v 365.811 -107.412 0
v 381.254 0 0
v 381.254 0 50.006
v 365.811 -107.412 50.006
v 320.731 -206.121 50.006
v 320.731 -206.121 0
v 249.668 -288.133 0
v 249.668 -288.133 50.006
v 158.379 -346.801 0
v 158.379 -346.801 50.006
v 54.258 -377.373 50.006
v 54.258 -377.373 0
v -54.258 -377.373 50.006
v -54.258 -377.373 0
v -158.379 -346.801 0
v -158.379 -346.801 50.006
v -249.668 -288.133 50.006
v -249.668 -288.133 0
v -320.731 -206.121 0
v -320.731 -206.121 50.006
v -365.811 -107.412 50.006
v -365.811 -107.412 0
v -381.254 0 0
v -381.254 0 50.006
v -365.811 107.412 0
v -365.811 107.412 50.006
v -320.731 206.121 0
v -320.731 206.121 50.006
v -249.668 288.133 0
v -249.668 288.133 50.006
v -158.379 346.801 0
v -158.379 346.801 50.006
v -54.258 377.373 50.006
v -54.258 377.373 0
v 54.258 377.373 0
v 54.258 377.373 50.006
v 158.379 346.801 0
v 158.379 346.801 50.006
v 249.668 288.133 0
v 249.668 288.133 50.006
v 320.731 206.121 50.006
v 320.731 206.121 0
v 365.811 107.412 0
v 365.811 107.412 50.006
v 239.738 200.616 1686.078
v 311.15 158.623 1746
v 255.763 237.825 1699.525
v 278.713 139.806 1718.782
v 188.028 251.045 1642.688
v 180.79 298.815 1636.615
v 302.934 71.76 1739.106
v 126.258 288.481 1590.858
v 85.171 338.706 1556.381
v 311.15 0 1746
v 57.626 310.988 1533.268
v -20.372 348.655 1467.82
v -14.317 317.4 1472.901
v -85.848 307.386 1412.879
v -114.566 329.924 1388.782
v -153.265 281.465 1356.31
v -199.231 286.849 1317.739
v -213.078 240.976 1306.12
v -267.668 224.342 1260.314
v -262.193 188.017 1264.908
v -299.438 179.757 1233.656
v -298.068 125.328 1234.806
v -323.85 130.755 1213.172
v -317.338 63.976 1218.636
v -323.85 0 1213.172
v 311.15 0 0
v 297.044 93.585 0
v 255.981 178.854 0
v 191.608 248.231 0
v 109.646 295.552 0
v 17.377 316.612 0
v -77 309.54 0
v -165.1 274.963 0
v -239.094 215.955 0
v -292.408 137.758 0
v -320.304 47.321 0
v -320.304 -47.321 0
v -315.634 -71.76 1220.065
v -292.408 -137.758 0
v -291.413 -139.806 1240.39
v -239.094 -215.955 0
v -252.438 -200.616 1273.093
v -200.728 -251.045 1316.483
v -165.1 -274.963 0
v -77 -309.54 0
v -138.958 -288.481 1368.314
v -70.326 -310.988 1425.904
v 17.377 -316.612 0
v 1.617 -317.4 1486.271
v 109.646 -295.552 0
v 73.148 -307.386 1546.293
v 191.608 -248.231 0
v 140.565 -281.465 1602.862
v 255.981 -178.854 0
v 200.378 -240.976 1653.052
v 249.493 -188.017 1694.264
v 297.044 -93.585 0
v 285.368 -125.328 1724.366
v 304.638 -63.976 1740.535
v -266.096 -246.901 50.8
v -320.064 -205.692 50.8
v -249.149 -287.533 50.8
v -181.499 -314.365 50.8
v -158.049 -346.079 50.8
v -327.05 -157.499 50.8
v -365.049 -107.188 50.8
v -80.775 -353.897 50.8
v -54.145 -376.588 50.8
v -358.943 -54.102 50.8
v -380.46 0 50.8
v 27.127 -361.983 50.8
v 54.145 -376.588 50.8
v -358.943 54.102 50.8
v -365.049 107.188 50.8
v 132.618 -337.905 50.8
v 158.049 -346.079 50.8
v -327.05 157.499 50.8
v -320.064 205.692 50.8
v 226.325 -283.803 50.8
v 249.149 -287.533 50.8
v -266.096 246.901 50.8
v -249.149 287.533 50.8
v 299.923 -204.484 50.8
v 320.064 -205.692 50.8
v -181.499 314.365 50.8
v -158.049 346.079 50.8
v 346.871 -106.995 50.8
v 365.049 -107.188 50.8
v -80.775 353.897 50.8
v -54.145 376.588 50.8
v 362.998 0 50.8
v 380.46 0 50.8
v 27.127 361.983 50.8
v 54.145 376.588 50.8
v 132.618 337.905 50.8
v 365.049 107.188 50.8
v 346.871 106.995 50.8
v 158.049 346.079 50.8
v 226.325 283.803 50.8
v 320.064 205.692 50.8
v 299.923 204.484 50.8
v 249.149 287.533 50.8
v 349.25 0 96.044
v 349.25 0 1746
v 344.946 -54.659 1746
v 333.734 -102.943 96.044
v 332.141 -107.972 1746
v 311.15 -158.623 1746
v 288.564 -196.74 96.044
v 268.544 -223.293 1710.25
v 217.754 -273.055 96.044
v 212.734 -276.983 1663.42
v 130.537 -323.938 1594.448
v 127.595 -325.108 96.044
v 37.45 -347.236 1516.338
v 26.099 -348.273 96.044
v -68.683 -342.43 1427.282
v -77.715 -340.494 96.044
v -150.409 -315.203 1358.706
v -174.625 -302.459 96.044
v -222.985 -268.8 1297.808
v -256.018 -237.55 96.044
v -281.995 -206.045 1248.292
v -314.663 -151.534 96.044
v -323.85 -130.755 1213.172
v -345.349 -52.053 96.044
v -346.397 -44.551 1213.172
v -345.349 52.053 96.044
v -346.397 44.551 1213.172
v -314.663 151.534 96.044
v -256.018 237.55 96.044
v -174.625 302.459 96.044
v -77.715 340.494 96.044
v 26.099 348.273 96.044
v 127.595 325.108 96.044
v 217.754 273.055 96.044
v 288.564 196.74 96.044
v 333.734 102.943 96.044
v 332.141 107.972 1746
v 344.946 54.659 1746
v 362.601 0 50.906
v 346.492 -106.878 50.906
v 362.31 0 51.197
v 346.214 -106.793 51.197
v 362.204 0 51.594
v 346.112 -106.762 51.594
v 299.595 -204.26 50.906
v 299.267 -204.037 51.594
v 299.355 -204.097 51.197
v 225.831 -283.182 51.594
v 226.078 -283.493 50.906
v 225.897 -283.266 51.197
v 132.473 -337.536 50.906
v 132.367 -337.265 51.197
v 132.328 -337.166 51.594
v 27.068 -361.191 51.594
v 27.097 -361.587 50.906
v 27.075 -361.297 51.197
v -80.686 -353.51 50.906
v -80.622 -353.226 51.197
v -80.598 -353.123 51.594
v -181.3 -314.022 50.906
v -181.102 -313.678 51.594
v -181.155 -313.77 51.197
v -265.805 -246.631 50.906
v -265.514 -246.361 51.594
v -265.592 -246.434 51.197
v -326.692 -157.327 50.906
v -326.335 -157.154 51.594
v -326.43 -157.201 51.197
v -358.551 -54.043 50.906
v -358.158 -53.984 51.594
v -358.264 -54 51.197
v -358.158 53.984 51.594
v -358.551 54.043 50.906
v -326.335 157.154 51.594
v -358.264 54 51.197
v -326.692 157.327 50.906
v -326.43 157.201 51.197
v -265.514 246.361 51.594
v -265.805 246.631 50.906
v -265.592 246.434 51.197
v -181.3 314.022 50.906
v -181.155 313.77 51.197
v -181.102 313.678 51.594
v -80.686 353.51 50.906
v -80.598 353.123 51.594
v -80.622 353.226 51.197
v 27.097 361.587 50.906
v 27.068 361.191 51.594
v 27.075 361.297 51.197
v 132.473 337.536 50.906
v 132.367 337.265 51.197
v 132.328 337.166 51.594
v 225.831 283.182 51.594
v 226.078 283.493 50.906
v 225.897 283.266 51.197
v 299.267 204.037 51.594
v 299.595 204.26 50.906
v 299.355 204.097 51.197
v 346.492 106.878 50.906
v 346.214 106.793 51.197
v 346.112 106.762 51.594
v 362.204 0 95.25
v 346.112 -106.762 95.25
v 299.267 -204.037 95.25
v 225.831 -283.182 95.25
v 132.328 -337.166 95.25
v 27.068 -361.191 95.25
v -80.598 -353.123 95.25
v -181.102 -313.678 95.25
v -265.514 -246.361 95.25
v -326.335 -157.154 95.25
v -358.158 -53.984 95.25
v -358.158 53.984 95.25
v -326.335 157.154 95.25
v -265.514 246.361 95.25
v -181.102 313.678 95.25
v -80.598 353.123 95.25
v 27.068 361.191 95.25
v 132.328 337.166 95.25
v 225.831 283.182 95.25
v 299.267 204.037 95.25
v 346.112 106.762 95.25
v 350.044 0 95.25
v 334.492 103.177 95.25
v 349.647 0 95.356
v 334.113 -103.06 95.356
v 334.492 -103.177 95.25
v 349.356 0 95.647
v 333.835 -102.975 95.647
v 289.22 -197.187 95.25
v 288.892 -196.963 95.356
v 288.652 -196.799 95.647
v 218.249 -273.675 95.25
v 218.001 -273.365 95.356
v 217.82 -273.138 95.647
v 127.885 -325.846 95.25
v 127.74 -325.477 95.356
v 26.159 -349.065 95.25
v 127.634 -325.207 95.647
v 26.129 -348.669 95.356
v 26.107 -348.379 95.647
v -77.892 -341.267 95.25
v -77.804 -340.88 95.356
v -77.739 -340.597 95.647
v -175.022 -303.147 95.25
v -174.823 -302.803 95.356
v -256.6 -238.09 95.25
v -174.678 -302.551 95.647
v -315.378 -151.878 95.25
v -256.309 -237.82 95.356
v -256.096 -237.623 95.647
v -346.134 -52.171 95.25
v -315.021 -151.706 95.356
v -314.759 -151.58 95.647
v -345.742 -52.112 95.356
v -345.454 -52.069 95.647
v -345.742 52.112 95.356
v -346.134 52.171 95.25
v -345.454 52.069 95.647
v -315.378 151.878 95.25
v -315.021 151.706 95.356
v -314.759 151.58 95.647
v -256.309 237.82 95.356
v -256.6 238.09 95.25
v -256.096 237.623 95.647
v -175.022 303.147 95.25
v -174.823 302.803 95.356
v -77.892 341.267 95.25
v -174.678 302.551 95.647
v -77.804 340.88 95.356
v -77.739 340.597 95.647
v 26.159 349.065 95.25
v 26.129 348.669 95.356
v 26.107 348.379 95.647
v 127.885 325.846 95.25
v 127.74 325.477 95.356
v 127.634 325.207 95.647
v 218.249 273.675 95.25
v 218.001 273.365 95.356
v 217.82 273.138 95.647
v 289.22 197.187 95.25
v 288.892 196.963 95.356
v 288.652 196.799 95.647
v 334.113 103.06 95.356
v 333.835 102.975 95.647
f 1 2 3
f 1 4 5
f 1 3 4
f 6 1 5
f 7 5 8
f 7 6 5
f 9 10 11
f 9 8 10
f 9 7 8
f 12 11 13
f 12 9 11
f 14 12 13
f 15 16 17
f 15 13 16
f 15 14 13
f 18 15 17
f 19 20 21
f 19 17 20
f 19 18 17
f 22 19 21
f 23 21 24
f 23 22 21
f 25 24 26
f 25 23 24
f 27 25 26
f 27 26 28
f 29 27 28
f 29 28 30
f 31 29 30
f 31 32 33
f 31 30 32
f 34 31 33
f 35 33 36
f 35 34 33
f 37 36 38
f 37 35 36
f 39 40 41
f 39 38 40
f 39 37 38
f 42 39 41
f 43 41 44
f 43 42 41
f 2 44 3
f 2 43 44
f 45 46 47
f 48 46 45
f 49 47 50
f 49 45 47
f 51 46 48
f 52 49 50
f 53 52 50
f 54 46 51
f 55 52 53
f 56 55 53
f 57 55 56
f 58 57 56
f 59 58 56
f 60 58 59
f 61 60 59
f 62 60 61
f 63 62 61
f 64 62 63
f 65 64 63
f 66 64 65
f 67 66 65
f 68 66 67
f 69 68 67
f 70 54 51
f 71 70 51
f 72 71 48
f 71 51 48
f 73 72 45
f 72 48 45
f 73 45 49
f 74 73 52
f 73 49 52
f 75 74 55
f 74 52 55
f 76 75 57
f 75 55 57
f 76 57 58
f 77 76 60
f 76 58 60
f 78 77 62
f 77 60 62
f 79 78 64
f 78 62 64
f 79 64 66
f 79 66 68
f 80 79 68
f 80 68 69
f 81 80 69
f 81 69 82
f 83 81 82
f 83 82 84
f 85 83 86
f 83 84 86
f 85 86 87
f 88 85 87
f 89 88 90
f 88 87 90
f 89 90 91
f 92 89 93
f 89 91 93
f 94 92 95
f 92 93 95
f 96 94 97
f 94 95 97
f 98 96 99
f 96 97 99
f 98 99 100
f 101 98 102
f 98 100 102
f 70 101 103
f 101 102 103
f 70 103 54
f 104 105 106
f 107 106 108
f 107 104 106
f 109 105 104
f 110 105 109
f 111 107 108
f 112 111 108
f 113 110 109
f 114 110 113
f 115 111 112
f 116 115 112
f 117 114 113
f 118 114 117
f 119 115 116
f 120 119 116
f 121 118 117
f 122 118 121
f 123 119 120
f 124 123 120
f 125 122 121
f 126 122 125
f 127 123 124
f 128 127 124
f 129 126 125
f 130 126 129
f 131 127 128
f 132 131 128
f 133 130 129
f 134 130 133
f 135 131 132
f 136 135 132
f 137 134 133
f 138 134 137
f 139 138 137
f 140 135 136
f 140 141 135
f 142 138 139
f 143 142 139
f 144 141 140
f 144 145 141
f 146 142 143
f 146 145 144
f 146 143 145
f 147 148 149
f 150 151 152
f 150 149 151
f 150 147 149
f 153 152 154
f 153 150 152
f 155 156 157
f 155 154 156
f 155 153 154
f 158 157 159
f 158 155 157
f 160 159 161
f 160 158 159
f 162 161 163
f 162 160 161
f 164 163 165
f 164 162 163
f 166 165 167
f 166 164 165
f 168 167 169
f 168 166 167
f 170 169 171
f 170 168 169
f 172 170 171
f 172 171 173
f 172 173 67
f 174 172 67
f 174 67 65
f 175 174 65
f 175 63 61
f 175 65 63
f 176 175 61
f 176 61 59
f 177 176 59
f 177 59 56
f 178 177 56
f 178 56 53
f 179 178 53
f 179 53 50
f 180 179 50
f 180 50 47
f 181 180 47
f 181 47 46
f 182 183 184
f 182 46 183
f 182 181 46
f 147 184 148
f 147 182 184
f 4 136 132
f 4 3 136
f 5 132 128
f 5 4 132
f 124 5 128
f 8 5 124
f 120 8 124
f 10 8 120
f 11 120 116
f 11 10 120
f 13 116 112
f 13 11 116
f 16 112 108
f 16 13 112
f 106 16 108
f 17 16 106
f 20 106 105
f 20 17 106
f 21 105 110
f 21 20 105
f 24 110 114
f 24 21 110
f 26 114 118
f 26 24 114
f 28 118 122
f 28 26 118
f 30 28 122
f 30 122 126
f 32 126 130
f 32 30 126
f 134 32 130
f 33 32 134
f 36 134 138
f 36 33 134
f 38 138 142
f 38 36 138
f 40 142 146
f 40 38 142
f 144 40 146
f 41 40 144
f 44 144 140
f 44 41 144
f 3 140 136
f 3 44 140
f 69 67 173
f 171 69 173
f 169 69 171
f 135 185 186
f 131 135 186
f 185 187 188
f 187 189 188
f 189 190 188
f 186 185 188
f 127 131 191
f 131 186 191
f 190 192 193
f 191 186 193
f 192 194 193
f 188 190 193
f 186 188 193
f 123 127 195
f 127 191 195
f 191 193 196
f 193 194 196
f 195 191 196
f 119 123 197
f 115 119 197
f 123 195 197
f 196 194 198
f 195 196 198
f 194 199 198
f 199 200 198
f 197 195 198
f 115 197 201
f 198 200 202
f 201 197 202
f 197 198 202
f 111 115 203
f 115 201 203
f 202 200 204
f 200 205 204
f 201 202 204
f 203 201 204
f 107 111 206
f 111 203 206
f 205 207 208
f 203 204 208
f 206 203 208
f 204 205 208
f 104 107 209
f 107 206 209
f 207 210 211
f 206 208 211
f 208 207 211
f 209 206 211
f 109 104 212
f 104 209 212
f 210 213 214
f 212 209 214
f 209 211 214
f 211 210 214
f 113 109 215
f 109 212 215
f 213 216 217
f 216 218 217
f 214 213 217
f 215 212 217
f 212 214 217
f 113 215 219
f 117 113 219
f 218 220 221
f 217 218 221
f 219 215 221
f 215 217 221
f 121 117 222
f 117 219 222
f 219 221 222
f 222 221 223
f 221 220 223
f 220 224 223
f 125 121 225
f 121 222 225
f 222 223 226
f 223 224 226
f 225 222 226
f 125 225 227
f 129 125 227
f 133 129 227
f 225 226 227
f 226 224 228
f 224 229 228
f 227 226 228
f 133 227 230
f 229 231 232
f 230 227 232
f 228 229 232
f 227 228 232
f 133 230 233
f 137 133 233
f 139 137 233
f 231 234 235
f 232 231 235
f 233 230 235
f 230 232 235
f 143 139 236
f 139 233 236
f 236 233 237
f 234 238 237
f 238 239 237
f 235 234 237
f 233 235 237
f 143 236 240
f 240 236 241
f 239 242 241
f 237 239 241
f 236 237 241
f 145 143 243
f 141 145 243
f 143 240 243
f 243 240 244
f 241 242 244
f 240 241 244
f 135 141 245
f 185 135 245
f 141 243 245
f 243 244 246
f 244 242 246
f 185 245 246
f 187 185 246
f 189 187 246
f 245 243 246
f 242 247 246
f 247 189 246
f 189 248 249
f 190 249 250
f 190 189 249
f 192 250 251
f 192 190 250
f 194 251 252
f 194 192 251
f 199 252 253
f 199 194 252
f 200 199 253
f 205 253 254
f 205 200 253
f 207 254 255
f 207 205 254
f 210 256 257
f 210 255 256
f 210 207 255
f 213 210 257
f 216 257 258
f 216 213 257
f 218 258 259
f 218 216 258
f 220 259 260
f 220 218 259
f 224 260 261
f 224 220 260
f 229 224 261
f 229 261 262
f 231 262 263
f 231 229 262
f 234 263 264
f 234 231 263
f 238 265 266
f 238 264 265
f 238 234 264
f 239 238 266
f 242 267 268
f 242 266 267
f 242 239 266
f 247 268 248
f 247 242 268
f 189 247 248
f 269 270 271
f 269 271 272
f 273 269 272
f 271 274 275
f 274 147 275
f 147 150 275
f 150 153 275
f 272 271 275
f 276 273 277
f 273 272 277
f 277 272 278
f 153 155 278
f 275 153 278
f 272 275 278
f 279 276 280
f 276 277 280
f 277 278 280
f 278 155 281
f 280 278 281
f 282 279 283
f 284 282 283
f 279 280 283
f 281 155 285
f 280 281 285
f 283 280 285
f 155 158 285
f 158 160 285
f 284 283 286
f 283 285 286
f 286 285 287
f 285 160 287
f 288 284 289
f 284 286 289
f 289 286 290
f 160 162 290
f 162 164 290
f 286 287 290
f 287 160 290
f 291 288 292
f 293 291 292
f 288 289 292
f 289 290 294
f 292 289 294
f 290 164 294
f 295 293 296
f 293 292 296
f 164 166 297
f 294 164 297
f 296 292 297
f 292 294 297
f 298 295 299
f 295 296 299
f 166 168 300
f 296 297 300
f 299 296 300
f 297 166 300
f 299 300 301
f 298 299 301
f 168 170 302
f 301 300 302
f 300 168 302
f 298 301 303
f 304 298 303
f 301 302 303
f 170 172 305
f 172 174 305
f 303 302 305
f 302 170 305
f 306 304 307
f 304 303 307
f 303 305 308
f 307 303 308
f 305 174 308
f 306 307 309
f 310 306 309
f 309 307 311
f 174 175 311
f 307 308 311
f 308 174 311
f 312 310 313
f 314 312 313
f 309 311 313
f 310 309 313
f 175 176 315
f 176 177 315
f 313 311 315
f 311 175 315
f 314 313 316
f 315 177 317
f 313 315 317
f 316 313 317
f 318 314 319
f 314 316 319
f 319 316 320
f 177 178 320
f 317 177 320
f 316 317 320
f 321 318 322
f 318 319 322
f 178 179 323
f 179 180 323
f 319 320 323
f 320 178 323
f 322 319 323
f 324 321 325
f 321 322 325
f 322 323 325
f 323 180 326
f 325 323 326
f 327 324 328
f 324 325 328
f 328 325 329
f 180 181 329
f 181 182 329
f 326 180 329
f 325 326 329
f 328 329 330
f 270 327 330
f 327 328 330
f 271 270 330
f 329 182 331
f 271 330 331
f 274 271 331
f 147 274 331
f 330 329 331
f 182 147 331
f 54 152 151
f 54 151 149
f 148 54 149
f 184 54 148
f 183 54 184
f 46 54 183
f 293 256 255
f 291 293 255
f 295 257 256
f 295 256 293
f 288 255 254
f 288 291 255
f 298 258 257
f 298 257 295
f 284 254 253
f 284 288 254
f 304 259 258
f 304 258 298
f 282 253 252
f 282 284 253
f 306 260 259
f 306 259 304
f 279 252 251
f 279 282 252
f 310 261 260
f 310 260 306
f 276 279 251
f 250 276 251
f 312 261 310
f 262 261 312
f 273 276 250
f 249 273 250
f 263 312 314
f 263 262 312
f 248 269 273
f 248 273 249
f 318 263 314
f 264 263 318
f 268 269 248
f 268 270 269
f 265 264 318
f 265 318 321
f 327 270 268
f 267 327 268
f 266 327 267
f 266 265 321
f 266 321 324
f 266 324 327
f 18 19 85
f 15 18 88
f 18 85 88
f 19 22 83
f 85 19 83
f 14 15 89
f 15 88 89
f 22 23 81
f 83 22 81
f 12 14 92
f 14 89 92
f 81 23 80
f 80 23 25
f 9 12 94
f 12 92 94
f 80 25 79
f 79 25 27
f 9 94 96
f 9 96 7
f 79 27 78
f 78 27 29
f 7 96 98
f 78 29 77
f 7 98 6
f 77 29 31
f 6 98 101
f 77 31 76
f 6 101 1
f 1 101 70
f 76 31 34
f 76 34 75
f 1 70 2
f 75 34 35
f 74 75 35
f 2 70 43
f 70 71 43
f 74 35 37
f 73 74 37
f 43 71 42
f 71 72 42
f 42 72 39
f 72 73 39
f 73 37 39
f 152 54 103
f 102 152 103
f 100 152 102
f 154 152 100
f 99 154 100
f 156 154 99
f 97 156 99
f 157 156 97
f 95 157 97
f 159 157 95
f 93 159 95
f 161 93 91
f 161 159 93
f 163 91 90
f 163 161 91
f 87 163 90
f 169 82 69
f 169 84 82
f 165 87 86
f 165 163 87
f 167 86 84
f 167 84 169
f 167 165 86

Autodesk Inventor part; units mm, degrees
ref_plane "YZ Plane" through (0, 0, 0) normal (1, 0, 0) x (0, 1, 0)
ref_plane "XZ Plane" through (0, 0, 0) normal (0, 1, 0) x (-1, 0, 0)
ref_plane "XY Plane" through (0, 0, 0) normal (0, 0, 1) x (1, 0, 0)
sketch "Sketch1" plane through (0, 0, 0) normal (0, 0, 1) x (1, 0, 0)
  circle A0 centre (0, 0) radius 381.254
  dimension "d0" = 762.508
extrude "Extrusion1" add sketch "Sketch1" along normal blind 50.8
sketch "Sketch2" plane through (0, 0, 0) normal (0, 0, 1) x (1, 0, 0)
  circle A0 centre (0, 0) radius 362.204
  dimension "d3" = 724.408
extrude "Extrusion2" add sketch "Sketch2" along normal blind 95.25
sketch "Sketch3" plane through (0, 0, 0) normal (0, 0, 1) x (1, 0, 0)
  circle A0 centre (0, 0) radius 349.25
  dimension "d6" = 698.5
extrude "Extrusion3" add sketch "Sketch3" along normal blind 1746
sketch "Sketch4" plane through (0, 0, 1746) normal (0, 0, 1) x (1, 0, 0)
  circle A0 centre (-6.35, 0) radius 317.5
  point P0 (0, 0)
  dimension "d9" = 635
  dimension "d24" = 6.35
extrude "Extrusion4" cut sketch "Sketch4" against normal through all
chamfer "Chamfer1" distance 0.7937 angle 45 1 edges at (-381.254, 0, 50.8)
fillet "Fillet1" radius 0.7937 1 edges at (-362.204, 0, 50.8)
fillet "Fillet2" radius 0.7937 1 edges at (-349.25, 0, 95.25)
sketch "Sketch5" plane through (0, 0, 0) normal (0, 1, 0) x (-1, 0, 0)
  line L0 (-311.15, 1746) -> (323.85, 1746) projected
  line L1 (-311.15, 1746) -> (323.85, 1213.1717)
  line L2 (323.85, 1213.1717) -> (349.25, 1213.1717)
  line L3 (349.25, 1213.1717) -> (349.25, 1746)
  line L4 (349.25, 1746) -> (323.85, 1746)
  line L5 (349.25, 96.0438) -> (349.25, 1746) construction
  point P0 (0, 0)
  dimension "d18" = 40
extrude "Extrusion5" cut sketch "Sketch5" along normal through all both and the other way through all
equation "\"BendRadius\" = Thickness"
equation "\"BendReliefWidth\" = Thickness"
equation "\"BendReliefDepth\" = 0.5 * Thickness"
equation "\"CornerReliefSize\" = 4 * Thickness"
equation "\"MinimumRemnant\" = 2 * Thickness"
equation "\"TransitionRadius\" = BendRadius"
equation "\"JacobiRadiusSize\" = Thickness"
equation "\"GapSize\" = Thickness"
equation "\"Thickness\" = 3.048"
properties part number "A1-19010-100-02 HCWI nozzle insert" material "Iron, Cast"
